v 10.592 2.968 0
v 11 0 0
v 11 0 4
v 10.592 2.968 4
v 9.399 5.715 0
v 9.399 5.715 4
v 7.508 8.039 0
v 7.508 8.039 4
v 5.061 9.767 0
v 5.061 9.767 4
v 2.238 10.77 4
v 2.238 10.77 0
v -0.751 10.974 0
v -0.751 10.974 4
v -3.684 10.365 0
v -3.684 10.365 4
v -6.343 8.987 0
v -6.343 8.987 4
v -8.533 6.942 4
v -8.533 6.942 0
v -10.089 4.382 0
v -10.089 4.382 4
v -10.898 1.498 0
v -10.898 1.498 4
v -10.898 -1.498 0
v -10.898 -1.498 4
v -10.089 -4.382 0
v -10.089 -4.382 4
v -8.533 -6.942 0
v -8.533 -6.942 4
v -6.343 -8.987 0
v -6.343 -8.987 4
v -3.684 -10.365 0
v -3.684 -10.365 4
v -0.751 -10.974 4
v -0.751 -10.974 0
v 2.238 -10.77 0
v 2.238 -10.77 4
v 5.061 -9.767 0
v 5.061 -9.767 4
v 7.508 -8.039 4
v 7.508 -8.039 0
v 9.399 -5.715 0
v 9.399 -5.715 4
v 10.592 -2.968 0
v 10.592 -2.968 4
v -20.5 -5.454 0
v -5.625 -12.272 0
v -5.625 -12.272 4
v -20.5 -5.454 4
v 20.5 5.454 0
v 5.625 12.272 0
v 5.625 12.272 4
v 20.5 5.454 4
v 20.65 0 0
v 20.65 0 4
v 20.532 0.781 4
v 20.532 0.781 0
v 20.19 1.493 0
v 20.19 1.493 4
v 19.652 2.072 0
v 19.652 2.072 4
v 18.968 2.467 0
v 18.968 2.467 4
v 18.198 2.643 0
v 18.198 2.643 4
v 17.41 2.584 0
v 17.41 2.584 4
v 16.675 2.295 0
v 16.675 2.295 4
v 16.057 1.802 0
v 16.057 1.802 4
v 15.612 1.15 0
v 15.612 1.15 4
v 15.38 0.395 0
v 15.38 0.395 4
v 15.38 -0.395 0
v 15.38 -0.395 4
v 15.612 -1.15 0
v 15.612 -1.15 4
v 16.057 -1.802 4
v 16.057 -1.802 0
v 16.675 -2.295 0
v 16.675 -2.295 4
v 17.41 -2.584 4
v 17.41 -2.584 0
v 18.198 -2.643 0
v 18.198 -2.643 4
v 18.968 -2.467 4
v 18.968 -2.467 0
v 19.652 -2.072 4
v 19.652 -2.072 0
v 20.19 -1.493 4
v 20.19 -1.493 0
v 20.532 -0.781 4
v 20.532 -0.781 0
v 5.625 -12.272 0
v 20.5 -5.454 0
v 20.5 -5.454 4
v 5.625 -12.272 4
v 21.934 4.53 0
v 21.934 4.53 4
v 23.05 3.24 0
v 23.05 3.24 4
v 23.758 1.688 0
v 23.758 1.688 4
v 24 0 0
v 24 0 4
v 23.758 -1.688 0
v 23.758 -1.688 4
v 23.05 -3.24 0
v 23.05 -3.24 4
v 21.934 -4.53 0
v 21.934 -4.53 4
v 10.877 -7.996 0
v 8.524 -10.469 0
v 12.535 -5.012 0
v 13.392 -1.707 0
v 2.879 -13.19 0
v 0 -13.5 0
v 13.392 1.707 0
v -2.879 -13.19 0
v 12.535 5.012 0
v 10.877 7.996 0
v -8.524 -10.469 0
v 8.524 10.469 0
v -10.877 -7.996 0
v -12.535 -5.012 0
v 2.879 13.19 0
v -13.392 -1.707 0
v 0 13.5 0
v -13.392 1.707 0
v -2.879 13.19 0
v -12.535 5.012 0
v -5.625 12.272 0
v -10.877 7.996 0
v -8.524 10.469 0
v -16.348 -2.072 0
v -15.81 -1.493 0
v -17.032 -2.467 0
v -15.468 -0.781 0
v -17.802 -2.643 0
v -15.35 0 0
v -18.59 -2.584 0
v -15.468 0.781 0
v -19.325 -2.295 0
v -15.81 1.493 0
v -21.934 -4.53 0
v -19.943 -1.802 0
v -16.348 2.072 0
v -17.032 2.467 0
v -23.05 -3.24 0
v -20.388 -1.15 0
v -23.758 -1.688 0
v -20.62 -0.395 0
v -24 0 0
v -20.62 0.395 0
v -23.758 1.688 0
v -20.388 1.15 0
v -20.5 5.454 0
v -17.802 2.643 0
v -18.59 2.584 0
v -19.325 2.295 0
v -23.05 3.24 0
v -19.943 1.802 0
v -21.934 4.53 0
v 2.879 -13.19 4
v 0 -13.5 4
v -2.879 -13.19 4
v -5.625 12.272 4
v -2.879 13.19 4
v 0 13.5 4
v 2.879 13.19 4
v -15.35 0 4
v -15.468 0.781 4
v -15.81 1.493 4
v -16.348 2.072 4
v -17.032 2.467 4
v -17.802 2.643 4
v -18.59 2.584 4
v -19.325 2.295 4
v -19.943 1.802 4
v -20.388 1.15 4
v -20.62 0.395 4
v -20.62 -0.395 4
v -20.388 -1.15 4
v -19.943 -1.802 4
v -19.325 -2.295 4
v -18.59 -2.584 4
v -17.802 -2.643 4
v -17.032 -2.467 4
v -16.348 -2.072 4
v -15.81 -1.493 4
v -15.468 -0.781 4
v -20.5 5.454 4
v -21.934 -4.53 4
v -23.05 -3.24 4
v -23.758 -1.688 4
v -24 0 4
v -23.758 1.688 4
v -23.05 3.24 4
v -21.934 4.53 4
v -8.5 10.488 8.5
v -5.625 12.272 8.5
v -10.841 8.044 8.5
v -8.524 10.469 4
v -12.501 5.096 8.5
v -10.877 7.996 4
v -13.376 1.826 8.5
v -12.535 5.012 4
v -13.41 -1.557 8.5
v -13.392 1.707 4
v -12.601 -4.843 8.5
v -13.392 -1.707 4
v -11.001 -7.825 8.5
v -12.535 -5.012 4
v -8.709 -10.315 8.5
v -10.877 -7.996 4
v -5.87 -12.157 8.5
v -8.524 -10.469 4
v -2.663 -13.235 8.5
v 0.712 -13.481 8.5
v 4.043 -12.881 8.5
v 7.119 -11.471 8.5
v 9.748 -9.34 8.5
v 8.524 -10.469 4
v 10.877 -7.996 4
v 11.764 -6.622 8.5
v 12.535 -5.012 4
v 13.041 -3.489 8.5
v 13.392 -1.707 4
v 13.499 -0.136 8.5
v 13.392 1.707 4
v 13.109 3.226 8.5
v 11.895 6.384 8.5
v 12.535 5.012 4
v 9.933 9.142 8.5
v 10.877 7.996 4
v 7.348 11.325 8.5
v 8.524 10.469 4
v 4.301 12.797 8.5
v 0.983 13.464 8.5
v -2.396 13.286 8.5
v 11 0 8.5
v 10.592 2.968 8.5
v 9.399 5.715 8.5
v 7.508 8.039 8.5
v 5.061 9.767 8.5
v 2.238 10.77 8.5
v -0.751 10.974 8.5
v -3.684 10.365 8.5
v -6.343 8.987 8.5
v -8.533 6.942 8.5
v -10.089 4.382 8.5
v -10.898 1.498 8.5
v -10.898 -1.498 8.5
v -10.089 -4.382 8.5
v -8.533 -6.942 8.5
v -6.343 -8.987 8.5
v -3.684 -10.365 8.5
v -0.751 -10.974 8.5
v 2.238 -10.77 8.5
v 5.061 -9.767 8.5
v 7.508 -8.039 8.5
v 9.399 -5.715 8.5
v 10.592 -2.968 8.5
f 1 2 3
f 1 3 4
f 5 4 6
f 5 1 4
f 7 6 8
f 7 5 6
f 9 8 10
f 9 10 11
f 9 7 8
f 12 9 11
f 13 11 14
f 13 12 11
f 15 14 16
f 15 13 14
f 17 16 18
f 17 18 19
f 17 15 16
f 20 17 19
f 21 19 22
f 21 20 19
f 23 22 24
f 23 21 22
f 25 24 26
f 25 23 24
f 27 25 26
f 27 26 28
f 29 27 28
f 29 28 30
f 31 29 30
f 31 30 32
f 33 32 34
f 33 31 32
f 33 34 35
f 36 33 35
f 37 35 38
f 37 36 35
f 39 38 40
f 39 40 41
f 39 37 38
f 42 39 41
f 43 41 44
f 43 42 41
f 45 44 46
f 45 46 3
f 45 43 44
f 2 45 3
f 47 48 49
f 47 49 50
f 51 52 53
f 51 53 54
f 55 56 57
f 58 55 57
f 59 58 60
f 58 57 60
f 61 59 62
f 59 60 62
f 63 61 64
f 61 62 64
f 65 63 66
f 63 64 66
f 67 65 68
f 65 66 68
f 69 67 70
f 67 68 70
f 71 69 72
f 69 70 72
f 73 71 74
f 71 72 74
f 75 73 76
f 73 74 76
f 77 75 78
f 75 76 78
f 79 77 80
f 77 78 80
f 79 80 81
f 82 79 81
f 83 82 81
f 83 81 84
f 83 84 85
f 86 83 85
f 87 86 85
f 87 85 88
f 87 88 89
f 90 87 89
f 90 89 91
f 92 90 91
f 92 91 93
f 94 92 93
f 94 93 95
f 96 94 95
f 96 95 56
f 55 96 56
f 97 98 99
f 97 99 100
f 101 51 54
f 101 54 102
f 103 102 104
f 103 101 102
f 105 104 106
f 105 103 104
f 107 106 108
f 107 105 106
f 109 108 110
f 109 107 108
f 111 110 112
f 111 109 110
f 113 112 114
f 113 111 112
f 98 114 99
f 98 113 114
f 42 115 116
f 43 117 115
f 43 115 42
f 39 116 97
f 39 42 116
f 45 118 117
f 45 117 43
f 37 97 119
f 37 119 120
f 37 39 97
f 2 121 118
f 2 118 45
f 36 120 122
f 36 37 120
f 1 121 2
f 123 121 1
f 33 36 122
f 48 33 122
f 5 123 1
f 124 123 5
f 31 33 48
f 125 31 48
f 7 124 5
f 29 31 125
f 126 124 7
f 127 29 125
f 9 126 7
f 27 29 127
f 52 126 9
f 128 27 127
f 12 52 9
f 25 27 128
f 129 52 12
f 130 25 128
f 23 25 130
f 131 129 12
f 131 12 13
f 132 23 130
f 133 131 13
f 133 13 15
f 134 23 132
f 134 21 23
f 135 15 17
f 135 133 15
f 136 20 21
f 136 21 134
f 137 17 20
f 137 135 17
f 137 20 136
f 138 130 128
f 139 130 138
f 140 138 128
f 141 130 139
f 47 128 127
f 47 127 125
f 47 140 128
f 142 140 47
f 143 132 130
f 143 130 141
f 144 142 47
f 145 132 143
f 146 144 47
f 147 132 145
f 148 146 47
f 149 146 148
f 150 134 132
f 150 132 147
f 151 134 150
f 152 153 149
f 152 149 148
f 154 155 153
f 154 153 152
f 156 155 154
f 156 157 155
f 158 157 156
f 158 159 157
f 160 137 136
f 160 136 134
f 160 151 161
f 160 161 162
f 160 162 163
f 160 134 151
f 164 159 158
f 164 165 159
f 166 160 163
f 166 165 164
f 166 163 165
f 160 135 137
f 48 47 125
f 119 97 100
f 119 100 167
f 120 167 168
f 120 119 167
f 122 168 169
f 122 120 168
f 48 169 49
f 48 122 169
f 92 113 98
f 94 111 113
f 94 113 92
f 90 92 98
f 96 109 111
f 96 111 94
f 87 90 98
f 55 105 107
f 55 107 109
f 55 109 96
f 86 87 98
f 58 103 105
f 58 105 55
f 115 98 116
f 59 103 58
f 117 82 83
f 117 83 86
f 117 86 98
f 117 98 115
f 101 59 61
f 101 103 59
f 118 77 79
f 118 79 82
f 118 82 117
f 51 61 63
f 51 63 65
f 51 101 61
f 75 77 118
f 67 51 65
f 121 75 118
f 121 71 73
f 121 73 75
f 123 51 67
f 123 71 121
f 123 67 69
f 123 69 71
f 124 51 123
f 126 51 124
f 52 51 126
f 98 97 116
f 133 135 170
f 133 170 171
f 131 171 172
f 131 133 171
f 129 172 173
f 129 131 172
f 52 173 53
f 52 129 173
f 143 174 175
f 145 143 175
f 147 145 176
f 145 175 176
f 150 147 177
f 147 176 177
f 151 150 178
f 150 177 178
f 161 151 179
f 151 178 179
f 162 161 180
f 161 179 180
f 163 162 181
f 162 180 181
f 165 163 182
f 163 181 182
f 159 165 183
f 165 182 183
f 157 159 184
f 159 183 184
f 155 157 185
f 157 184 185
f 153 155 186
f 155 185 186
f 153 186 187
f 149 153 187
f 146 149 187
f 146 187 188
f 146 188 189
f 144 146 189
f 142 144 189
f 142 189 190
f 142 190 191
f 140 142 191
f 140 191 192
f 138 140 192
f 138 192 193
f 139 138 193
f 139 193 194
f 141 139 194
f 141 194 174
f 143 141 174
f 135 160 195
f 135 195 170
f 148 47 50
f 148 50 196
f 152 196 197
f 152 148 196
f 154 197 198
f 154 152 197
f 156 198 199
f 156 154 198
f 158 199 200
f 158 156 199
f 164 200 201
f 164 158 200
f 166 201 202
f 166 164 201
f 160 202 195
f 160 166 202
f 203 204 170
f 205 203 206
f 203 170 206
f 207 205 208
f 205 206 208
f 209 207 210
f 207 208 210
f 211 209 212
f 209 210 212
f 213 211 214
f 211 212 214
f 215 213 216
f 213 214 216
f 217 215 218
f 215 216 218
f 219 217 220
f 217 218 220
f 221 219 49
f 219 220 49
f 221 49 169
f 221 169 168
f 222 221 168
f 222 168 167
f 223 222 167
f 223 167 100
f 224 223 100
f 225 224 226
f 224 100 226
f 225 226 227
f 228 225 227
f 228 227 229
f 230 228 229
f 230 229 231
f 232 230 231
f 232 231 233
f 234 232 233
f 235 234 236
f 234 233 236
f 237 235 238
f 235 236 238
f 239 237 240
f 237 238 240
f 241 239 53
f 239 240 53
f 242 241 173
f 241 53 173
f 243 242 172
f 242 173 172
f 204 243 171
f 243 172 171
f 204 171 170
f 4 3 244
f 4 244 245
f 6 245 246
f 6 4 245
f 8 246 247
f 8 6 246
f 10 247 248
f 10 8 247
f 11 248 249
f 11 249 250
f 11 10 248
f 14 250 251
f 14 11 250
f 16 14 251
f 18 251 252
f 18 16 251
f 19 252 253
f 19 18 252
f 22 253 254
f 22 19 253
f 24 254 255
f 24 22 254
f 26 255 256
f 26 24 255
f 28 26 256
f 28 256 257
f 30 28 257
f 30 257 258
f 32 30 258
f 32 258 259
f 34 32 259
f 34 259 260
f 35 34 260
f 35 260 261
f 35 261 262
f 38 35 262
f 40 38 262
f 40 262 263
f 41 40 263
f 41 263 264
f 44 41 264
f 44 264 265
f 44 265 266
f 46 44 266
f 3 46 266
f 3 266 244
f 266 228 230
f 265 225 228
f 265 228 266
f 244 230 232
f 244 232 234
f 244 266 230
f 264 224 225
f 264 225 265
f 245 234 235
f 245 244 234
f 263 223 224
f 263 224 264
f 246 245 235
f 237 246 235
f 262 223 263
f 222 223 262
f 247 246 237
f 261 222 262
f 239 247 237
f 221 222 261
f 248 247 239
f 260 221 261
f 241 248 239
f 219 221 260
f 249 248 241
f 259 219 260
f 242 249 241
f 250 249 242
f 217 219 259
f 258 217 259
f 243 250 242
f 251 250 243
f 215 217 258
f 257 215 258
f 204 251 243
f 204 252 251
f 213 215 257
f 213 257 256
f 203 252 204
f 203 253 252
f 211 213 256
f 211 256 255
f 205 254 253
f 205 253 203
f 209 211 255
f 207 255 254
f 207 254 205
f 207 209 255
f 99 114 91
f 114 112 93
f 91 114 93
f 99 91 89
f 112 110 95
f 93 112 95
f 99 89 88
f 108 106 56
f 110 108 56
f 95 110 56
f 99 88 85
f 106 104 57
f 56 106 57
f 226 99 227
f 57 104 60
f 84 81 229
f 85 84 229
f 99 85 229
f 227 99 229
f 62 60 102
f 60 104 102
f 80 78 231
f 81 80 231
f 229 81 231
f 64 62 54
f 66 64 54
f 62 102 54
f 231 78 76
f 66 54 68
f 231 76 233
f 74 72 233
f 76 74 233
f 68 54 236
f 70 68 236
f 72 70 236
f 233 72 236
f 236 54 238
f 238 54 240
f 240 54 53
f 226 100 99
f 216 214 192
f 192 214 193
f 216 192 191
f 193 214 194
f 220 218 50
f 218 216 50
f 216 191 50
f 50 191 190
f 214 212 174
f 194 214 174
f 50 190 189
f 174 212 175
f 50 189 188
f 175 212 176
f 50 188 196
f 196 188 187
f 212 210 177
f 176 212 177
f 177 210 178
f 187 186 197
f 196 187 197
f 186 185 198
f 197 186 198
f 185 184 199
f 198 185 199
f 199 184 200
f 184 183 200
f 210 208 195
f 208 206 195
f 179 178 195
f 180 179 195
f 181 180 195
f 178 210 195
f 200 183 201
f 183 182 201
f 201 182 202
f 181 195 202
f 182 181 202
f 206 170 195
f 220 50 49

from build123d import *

# Parameters (mm, degrees)
BASE_SKETCH_R                     = 11
BASE_EXTRUDE_DEPTH                = 4
BEARING_RETAINING_RING_SKETCH_R   = 13.5
BEARING_RETAINING_RING_SKETCH_R_2 = 11
BEARING_RETAINING_RING_DEPTH      = 8.5
MOUNTING_HOLES_D                  = 5.3


with BuildPart() as part:
    # Base Sketch → Base Extrude (new body)
    with BuildSketch(Plane.XY):
        with BuildLine():
            Line((-20.5, 5.454356057), (-5.625, 12.272301129))
            ThreePointArc((-5.625, 12.272301129), (0, 13.5), (5.625, 12.272301129))
            Line((5.625, 12.272301129), (20.5, 5.454356057))
            ThreePointArc((20.5, 5.454356057), (24, 0), (20.5, -5.454356057))
            Line((20.5, -5.454356057), (5.625, -12.272301129))
            ThreePointArc((5.625, -12.272301129), (0, -13.5), (-5.625, -12.272301129))
            Line((-5.625, -12.272301129), (-20.5, -5.454356057))
            ThreePointArc((-20.5, -5.454356057), (-24, 0), (-20.5, 5.454356057))
        make_face()
        Circle(BASE_SKETCH_R, mode=Mode.SUBTRACT)
    extrude(amount=BASE_EXTRUDE_DEPTH)

    # Bearing Retaining Ring Sketch → Bearing Retaining Ring (add)
    with BuildSketch(Plane.XY):
        with Locations(Location((0, 0, 0), (0, 0, 114.624318352))):
            Circle(BEARING_RETAINING_RING_SKETCH_R)
        Circle(BEARING_RETAINING_RING_SKETCH_R_2, mode=Mode.SUBTRACT)
    extrude(amount=BEARING_RETAINING_RING_DEPTH)

    # Mounting Holes (through all)
    with Locations(Plane(origin=(0, 0, 0), x_dir=(-1, 0, 0), z_dir=(0, 0, -1))):
        with Locations((18, 0), (-18, 0)):
            Hole(MOUNTING_HOLES_D / 2)


solid = part.part
